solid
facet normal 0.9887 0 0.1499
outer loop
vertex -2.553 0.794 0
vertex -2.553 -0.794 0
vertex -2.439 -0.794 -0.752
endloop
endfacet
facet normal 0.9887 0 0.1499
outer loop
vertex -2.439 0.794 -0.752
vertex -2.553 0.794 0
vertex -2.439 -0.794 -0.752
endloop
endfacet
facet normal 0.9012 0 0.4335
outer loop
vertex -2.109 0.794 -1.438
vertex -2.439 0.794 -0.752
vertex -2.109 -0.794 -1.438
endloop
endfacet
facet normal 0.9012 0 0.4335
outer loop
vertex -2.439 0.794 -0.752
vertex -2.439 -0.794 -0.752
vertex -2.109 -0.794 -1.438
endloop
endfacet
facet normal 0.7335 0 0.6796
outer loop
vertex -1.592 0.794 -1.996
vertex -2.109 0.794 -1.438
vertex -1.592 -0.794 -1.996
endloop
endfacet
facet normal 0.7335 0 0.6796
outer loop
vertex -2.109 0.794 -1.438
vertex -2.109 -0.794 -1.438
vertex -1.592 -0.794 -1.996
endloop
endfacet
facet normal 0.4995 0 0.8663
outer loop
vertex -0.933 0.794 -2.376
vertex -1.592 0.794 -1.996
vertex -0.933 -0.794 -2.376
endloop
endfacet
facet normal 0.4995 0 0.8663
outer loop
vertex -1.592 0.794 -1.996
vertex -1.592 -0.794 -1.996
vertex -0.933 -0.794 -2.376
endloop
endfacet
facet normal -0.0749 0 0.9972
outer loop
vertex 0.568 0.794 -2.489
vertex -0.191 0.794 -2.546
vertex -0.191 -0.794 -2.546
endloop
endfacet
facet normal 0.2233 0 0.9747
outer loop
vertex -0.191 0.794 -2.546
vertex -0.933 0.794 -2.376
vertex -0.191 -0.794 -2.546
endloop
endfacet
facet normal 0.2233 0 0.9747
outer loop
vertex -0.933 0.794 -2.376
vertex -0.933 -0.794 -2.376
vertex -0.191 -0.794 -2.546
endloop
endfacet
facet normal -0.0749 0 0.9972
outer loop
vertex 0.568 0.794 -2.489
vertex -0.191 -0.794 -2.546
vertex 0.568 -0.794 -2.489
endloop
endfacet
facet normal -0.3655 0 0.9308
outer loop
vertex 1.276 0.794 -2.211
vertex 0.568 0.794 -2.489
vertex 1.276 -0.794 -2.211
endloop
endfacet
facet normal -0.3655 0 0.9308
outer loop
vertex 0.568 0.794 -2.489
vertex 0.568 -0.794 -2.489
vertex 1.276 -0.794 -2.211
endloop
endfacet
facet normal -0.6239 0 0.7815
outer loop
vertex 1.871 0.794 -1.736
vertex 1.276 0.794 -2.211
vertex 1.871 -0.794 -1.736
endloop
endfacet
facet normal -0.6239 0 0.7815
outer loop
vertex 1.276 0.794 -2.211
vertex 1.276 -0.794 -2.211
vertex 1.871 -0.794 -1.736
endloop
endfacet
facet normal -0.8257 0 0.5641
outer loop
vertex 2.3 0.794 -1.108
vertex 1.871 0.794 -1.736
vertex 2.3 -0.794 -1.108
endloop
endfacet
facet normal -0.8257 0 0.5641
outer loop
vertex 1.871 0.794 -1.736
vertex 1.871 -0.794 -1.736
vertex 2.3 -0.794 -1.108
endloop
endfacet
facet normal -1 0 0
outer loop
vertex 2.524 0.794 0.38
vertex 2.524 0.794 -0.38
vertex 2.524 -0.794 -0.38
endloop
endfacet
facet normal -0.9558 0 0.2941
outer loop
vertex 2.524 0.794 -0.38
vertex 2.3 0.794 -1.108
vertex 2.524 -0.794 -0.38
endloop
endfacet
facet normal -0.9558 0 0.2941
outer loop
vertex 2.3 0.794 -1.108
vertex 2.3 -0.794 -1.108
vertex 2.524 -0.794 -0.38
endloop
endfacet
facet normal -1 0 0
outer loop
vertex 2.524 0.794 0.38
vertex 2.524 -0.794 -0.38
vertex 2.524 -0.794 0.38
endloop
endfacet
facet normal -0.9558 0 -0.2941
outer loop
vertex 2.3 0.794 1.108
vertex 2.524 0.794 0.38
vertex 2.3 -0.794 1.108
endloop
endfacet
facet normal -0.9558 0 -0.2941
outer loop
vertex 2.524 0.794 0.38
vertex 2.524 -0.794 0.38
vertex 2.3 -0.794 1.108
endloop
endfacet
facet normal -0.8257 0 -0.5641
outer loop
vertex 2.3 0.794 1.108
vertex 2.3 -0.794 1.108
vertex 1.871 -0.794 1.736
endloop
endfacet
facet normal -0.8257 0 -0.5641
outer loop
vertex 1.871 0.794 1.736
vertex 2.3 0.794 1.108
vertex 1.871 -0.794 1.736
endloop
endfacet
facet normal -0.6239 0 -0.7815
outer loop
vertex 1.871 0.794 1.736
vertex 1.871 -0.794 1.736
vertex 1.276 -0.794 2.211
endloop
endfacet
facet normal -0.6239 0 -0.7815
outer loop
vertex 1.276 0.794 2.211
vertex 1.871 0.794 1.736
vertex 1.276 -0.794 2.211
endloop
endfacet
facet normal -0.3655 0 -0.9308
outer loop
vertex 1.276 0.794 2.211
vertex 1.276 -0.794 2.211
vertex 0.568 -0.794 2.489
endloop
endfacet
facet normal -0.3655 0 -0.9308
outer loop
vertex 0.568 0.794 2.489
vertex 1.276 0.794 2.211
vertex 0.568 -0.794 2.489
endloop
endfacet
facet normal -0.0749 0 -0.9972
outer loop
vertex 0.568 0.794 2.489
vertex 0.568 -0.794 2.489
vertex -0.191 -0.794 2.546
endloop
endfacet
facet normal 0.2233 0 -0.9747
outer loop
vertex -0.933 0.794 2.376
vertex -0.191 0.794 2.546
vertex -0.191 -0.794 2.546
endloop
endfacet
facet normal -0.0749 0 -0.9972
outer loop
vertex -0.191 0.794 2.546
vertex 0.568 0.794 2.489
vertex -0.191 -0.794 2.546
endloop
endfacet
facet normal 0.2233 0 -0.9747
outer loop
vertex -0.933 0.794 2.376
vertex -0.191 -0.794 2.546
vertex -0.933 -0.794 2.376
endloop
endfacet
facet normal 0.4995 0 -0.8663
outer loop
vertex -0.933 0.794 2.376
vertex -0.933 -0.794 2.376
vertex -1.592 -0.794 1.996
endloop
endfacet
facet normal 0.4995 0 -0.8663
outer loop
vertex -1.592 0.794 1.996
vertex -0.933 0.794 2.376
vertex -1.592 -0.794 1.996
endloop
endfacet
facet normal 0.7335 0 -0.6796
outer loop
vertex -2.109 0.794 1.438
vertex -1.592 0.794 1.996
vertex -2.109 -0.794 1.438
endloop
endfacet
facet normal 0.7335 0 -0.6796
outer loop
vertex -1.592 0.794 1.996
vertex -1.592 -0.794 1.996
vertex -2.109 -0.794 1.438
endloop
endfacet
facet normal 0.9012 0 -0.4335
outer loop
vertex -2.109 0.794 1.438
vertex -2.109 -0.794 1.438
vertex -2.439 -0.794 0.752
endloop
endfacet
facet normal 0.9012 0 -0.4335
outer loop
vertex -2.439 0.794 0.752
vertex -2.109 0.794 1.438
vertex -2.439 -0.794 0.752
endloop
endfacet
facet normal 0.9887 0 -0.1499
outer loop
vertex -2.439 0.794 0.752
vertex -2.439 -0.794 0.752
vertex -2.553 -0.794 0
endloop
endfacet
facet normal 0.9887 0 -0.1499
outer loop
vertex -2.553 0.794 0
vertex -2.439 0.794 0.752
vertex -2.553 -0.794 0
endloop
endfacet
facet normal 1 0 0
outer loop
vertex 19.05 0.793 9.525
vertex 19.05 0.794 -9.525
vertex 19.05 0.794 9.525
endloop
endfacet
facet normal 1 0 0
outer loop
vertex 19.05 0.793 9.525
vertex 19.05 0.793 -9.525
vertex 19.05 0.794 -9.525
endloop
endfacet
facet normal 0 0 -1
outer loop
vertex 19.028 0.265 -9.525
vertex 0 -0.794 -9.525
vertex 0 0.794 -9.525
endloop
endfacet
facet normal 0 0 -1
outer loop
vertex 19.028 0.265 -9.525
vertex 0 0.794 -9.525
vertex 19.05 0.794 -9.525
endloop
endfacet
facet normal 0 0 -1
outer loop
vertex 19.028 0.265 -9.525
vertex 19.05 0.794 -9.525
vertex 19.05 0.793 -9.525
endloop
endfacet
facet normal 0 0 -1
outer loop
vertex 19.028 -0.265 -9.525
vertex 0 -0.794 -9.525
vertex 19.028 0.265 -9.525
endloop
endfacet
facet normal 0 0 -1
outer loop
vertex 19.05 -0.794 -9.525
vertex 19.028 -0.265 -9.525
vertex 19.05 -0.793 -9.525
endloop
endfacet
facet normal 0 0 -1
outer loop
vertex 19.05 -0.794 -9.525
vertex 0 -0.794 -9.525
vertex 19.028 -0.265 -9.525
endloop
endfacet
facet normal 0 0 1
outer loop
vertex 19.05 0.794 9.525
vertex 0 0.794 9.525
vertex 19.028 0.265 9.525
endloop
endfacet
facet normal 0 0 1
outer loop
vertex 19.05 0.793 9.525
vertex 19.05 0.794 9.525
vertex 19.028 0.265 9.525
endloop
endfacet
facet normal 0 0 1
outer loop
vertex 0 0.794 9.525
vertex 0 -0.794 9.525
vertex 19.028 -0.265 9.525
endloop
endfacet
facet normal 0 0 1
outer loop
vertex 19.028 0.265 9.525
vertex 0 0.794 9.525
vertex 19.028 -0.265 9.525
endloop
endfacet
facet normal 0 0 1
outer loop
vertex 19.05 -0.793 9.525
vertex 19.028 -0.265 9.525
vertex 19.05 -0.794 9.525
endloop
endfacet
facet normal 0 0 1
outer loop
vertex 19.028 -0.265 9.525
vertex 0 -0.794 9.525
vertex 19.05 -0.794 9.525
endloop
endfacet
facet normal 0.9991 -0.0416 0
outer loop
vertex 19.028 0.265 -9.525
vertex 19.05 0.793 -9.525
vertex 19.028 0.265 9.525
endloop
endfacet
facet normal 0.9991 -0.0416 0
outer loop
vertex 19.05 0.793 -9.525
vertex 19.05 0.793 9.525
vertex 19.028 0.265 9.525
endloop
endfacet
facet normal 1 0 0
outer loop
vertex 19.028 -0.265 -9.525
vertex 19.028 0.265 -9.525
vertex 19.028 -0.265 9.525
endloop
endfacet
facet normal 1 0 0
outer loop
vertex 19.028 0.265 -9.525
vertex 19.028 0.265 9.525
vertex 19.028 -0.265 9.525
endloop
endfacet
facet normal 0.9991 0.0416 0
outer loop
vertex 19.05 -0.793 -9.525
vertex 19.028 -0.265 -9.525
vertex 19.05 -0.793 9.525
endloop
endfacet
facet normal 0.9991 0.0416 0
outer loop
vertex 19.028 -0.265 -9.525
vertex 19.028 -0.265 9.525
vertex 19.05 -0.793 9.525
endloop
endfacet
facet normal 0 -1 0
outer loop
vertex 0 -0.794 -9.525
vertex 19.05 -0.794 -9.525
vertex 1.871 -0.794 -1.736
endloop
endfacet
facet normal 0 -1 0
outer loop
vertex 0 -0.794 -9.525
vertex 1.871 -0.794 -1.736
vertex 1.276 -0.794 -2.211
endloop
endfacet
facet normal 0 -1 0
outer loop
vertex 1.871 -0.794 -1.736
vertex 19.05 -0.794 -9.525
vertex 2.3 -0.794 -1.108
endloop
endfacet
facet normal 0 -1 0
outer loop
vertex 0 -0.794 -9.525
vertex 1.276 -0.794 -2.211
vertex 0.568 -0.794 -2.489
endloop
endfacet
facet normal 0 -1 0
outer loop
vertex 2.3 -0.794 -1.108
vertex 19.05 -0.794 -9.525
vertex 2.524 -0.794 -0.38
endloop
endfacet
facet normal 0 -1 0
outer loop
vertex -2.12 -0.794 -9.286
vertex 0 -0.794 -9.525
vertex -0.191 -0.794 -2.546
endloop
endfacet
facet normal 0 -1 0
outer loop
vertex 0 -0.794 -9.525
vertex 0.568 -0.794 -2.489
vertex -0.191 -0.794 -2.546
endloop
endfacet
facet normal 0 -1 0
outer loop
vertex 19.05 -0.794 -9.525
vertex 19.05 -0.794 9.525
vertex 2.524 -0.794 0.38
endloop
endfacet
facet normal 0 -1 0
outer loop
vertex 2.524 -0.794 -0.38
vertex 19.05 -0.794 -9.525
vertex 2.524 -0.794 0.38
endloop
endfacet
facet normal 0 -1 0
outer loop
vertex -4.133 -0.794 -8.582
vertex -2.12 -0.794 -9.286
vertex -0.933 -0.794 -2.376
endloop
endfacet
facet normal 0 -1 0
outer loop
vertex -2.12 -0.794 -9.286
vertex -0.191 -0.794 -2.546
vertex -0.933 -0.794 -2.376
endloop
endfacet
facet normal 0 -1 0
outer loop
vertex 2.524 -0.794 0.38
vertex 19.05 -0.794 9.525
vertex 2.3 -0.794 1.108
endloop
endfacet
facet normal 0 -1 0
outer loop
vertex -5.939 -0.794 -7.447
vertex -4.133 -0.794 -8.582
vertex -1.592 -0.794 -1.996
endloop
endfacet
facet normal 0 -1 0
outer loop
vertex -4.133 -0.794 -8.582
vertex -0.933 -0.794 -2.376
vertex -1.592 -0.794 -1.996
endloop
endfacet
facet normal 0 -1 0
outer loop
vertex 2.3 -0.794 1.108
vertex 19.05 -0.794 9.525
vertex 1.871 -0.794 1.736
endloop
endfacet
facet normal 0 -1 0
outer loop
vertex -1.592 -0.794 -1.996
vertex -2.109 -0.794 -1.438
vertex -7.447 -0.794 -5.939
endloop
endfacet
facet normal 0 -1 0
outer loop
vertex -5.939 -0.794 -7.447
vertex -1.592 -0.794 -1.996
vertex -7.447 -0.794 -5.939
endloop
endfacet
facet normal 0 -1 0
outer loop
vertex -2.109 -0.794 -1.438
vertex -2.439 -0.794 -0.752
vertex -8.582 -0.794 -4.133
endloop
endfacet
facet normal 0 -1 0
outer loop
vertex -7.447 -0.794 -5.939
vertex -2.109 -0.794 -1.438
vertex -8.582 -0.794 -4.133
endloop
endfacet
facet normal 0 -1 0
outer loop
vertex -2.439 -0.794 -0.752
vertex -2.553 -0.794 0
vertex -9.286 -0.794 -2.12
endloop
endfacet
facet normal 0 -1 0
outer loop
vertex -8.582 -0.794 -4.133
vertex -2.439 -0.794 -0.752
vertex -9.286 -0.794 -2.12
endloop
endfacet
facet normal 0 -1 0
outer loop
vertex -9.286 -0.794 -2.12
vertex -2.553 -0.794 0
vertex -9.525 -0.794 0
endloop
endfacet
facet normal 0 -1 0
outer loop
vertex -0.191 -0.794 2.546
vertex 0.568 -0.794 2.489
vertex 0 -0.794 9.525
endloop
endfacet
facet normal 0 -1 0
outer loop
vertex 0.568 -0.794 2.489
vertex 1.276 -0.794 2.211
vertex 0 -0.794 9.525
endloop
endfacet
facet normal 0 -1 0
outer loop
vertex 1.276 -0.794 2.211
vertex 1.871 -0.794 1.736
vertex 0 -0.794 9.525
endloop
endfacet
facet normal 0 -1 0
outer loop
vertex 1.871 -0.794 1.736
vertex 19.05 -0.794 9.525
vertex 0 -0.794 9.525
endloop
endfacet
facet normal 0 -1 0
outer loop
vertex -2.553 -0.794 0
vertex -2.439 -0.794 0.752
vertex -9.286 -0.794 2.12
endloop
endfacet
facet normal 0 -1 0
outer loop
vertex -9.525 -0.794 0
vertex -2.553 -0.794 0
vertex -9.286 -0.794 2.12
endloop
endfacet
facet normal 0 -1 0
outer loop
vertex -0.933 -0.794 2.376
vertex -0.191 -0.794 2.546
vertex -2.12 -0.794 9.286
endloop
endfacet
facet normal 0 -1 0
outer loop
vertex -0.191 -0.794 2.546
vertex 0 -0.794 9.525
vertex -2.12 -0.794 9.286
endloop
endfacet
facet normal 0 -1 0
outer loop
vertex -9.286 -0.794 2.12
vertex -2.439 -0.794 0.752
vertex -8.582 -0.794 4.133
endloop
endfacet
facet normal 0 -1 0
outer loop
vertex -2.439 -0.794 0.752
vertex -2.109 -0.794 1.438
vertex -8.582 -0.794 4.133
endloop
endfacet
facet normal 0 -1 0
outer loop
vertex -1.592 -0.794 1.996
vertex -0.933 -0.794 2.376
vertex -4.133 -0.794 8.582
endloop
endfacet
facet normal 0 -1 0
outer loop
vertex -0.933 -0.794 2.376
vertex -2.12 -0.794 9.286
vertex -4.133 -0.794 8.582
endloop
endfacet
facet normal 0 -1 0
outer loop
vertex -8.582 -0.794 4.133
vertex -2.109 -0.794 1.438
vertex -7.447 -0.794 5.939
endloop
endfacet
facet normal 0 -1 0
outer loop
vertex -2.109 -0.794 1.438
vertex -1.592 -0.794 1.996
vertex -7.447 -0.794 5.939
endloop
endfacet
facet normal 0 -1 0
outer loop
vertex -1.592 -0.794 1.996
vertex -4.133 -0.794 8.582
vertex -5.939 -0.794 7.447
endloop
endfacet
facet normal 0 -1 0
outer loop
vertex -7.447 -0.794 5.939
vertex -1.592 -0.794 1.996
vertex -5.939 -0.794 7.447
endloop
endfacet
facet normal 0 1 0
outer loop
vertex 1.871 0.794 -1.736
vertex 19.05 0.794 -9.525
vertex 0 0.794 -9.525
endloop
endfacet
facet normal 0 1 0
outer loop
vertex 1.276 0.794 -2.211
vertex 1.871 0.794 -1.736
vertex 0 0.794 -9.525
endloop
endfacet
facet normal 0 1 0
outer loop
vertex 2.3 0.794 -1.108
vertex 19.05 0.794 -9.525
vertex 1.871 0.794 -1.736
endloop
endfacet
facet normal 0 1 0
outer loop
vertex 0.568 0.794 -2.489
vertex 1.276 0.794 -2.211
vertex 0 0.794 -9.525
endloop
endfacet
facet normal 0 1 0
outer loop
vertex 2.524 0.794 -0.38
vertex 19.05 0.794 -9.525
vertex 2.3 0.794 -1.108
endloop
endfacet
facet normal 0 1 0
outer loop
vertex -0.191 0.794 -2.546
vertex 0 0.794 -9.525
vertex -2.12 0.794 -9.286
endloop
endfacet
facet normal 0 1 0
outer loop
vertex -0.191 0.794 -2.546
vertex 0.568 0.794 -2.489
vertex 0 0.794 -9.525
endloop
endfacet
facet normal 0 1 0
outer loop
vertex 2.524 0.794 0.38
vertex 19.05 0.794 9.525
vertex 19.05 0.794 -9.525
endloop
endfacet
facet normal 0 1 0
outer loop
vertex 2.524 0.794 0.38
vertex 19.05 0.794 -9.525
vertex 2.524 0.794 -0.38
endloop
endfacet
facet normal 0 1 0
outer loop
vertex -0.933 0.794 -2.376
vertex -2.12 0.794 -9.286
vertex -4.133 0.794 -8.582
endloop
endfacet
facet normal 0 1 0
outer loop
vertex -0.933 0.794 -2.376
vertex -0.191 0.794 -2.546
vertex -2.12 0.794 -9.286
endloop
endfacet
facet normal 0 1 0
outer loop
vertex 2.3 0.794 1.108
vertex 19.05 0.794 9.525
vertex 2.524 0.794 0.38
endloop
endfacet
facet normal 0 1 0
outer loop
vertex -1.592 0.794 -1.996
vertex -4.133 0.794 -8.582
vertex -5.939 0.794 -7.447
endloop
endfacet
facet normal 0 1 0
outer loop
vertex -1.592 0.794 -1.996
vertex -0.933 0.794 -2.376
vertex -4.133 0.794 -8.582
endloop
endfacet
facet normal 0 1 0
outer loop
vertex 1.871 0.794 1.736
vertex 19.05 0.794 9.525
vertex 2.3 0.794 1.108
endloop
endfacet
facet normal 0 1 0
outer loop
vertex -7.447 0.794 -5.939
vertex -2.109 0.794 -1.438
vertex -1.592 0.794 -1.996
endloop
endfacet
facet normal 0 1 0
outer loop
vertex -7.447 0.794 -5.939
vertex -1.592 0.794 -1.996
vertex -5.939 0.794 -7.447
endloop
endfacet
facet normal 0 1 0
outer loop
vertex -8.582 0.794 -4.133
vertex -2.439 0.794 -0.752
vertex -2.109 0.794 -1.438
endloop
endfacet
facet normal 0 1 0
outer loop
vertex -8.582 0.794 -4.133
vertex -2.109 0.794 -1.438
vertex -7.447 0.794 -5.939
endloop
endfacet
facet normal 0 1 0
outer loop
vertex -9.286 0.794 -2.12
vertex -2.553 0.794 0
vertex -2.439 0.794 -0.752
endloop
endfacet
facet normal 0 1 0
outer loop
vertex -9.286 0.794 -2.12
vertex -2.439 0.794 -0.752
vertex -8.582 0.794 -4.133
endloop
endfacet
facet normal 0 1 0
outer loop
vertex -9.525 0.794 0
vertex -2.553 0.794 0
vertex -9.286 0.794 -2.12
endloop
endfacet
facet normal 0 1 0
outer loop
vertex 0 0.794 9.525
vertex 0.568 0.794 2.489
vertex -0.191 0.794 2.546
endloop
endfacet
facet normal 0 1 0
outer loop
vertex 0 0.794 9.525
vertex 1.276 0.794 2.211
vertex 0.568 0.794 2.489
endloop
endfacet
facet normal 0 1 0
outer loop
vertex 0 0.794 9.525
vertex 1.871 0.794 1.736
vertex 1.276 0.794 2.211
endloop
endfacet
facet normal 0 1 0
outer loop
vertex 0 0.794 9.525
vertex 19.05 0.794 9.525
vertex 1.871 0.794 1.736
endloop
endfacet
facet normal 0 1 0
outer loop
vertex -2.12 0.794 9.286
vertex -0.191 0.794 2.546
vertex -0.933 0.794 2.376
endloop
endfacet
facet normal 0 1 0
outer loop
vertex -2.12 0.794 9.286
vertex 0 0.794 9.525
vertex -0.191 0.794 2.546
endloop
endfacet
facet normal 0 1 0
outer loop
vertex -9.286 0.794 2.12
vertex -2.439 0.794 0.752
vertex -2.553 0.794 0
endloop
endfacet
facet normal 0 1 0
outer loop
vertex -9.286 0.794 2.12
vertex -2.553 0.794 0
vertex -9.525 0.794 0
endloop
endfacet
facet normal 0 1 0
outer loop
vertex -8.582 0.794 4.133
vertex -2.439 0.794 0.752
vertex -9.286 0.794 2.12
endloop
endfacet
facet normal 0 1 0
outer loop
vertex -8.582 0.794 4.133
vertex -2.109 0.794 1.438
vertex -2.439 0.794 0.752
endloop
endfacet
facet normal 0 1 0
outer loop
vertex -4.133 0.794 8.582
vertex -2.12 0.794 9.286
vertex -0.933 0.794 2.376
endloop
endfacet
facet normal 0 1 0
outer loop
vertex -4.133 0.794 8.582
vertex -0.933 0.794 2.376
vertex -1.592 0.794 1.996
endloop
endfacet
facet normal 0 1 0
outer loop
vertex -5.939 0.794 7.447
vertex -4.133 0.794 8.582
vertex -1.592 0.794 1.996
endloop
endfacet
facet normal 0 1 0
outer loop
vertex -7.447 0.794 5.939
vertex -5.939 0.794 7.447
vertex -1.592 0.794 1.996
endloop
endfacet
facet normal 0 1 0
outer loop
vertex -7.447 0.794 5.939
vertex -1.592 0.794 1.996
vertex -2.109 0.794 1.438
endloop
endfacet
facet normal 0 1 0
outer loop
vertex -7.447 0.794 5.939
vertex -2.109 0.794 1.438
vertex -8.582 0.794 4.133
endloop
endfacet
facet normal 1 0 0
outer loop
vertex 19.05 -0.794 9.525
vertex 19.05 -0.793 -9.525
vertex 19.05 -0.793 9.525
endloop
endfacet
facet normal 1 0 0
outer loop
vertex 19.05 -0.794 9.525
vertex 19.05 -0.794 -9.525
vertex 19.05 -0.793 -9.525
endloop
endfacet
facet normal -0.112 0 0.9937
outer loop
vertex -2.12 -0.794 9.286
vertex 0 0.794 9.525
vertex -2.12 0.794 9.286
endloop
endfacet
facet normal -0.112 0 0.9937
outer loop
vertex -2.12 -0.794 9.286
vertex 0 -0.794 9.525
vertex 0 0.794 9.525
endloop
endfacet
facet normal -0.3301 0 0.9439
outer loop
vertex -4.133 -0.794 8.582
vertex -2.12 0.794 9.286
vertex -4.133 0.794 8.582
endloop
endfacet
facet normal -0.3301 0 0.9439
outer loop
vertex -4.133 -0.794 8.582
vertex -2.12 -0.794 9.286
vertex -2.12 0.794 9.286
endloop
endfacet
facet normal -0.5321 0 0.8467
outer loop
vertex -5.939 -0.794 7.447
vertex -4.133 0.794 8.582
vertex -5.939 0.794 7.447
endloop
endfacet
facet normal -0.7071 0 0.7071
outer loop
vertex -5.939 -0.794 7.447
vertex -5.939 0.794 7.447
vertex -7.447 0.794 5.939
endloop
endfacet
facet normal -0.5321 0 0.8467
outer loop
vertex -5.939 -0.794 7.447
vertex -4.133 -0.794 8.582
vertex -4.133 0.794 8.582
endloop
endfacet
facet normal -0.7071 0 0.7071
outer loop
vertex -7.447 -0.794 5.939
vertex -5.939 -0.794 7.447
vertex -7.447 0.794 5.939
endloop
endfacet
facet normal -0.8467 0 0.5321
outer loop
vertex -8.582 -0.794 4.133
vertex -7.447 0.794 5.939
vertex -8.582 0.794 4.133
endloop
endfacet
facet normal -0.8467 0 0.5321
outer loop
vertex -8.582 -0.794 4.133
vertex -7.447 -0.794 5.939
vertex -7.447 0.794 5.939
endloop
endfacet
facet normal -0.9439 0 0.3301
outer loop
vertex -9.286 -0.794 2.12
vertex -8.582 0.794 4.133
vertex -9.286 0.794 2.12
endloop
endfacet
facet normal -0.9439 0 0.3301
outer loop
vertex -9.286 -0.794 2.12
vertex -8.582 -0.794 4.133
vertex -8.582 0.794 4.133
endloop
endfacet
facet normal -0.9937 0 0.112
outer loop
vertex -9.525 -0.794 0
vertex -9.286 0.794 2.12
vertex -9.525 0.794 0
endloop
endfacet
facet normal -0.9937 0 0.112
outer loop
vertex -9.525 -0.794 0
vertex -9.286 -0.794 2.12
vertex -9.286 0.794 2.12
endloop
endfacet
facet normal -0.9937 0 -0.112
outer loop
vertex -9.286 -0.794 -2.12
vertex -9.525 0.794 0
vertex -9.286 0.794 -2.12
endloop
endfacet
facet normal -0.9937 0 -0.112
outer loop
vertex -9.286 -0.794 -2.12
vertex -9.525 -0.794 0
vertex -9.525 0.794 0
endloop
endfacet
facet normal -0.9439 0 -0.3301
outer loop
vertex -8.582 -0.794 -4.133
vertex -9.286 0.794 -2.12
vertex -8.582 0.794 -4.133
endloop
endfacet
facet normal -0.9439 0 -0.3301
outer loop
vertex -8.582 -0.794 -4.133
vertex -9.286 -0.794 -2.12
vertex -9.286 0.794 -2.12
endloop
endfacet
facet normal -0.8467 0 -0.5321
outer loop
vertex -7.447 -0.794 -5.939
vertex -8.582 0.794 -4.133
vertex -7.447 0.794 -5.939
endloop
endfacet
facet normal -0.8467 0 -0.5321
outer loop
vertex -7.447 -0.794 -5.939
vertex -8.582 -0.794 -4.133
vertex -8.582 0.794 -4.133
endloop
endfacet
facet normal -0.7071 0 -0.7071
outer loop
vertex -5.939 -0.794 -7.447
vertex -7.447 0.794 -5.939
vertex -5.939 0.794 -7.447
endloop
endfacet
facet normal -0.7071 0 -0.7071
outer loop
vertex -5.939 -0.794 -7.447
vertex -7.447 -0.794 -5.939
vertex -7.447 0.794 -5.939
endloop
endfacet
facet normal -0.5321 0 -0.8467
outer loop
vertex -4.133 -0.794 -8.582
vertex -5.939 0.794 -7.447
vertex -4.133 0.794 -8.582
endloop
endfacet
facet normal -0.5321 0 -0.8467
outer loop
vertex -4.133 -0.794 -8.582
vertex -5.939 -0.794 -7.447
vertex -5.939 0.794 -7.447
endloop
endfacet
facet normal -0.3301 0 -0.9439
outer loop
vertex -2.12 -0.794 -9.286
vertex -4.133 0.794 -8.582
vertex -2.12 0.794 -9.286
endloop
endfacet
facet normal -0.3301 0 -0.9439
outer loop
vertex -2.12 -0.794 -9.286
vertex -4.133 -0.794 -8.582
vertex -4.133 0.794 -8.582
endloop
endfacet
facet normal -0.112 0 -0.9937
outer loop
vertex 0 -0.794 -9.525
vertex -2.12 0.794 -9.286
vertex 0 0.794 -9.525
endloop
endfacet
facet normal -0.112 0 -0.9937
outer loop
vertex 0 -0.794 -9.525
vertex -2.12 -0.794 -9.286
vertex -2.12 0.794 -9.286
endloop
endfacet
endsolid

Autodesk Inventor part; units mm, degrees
ref_plane "YZ Plane" through (0, 0, 0) normal (1, 0, 0) x (0, 1, 0)
ref_plane "XZ Plane" through (0, 0, 0) normal (0, 1, 0) x (-1, 0, 0)
ref_plane "XY Plane" through (0, 0, 0) normal (0, 0, 1) x (1, 0, 0)
sketch "Sketch1" plane through (0, 0, 0) normal (0, 1, 0) x (-1, 0, 0)
  circle A0 centre (0, 0) radius 2.5527
  circle A1 centre (0, 0) radius 9.525
  line L0 (0, 9.525) -> (-19.05, 9.525)
  line L1 (0, -9.525) -> (-19.05, -9.525)
  line L2 (-19.05, -9.525) -> (-19.05, 9.525)
  dimension "d0" = 5.1054
  dimension "d1" = 19.05
  dimension "d2" = 19.05
  dimension "d3" = 19.05
extrude "Extrusion1" add sketch "Sketch1" along normal mid plane 1.5875
sketch "Sketch2" plane through (0, 0, 0) normal (0, 0, 1) x (1, 0, 0)
  line L0 (0, 0) -> (31.7252, 0)
  circle A0 centre (31.7252, 0) radius 12.7
  point P0 (19.05, 0.7937)
  dimension "d7" = 25.4
extrude "Extrusion2" cut sketch "Sketch2" along normal mid plane 50.8
properties part number "firewalltab2" material "Steel"
